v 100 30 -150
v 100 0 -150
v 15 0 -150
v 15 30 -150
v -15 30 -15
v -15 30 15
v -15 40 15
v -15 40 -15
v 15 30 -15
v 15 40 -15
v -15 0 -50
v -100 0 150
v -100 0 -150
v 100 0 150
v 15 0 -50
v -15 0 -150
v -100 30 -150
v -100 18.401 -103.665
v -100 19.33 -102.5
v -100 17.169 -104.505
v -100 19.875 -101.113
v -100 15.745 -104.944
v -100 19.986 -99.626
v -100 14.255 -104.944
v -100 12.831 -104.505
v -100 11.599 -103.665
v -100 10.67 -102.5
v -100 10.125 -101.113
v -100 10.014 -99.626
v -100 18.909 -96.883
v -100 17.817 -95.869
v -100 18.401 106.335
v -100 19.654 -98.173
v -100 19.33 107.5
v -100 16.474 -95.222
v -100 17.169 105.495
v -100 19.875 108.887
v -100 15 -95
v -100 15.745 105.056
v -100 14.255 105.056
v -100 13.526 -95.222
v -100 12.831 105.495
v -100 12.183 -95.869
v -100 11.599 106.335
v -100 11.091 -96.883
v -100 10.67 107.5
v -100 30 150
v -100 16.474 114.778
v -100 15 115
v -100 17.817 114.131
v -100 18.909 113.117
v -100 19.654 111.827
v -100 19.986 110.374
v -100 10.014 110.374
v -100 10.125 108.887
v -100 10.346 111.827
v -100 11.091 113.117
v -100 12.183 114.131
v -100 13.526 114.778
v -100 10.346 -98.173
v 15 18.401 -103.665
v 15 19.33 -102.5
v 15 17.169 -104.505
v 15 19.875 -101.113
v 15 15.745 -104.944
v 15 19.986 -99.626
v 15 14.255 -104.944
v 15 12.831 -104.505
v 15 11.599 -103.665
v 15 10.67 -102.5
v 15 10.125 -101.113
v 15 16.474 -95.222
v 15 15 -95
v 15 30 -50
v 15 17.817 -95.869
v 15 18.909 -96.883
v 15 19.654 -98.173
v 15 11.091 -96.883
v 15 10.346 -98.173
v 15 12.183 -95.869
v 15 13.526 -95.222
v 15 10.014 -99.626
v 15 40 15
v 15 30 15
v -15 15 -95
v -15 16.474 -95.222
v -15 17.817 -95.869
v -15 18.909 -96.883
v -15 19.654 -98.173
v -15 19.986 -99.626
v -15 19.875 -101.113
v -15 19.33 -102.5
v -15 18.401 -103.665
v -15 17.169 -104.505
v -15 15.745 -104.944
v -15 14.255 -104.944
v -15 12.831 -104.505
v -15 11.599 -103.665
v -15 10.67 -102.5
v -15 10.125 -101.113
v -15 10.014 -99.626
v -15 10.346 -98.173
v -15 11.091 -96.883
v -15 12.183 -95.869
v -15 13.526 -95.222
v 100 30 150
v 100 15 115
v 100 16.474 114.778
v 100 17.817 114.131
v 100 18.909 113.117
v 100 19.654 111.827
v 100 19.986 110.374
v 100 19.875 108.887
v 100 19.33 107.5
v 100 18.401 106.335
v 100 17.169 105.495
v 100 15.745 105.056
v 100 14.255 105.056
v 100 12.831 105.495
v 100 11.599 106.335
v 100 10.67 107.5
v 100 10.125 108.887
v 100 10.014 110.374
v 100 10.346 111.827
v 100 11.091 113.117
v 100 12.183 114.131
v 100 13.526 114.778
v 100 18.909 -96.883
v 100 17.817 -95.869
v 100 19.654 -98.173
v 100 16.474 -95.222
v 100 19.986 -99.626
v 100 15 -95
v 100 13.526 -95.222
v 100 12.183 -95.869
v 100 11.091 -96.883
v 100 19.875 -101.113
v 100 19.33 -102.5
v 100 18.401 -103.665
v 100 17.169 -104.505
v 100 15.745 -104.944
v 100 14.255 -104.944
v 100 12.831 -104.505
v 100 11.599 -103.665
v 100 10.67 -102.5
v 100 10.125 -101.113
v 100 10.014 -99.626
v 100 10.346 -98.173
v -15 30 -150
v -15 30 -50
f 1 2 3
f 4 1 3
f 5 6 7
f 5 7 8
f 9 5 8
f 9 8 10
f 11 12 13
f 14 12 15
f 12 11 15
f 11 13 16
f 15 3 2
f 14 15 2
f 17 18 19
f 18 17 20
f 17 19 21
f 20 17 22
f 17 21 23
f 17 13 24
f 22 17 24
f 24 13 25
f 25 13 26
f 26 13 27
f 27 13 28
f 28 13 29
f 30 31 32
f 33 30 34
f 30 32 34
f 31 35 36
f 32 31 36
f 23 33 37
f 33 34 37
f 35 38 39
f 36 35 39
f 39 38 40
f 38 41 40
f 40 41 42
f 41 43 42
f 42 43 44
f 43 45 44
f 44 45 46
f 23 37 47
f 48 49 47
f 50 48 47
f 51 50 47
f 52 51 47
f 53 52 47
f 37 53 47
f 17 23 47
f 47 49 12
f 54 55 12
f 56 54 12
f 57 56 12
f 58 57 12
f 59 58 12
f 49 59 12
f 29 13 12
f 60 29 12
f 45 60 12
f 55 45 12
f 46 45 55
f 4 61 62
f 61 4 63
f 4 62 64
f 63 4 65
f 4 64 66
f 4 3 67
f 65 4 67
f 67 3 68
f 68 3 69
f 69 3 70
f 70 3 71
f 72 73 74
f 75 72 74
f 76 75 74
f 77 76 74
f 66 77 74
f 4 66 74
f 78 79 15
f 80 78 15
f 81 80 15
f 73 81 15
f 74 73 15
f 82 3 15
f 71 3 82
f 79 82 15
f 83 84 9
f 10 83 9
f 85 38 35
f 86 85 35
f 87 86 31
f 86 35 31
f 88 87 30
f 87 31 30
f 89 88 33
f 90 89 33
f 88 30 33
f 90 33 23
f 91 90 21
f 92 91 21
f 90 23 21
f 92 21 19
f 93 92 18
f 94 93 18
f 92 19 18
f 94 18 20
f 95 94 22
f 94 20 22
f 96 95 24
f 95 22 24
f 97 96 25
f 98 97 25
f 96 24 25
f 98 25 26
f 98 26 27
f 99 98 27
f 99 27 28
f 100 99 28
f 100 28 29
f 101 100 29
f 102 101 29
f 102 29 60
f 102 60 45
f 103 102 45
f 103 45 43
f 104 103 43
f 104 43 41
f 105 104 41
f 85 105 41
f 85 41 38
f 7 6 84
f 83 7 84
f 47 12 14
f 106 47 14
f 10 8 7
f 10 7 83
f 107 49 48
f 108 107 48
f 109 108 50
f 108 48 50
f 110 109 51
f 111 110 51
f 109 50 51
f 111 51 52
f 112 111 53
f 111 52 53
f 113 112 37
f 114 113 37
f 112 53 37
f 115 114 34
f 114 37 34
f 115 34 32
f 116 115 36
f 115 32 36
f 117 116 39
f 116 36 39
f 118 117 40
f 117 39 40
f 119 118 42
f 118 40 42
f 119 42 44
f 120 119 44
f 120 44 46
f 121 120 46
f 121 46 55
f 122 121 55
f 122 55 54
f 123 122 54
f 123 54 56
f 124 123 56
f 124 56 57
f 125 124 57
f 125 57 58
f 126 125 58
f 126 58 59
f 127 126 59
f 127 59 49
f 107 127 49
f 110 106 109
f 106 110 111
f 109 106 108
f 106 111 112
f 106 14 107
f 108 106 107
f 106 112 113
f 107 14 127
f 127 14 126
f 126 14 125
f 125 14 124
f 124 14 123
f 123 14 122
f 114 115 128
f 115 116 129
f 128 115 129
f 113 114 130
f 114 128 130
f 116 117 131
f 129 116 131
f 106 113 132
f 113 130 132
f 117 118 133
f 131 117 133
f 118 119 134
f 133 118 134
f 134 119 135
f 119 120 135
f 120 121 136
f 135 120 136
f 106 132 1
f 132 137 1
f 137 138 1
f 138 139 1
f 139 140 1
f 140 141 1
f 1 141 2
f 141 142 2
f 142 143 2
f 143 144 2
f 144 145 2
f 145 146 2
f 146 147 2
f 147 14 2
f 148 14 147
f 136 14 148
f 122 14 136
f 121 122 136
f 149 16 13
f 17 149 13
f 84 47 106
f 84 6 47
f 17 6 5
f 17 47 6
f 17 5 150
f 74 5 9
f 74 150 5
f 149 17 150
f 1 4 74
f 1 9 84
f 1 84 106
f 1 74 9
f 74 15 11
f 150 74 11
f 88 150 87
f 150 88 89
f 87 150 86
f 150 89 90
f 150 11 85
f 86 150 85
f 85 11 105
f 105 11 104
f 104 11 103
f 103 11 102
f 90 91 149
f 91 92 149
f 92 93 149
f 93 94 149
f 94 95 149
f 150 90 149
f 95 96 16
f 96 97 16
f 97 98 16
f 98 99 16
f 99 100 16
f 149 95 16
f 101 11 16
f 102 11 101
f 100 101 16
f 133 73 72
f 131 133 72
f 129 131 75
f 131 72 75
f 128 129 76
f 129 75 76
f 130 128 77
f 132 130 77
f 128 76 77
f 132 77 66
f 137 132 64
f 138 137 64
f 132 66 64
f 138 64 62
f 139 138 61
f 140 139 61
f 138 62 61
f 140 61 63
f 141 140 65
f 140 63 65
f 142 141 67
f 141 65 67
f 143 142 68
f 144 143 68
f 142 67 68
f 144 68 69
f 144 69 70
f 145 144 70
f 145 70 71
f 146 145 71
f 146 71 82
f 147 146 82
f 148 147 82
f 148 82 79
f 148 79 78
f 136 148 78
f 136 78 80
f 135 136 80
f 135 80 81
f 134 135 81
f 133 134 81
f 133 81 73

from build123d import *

# Parameters (mm, degrees)
EXTRUDE_1_DEPTH     = 30
SKETCH_2_R          = 5
CUT_EXTRUDE_1_DEPTH = 335
SKETCH_3_W          = 30
SKETCH_3_H          = 30
EXTRUDE_2_DEPTH     = 10


with BuildPart() as part:
    # 草圖1 → 填料-伸長1 (new body)
    with BuildSketch(Plane(origin=(0, 0, 0), x_dir=(1, 0, 0), z_dir=(0, 1, 0))):
        Polygon((-100, -150), (100, -150), (100, 150), (15, 150), (15, 50), (-15, 50), (-15, 150), (-100, 150), align=None)
    extrude(amount=EXTRUDE_1_DEPTH)

    # 草圖2 → 除料-伸長1 (cut)
    with BuildSketch(Plane.ZY.offset(100)):
        with Locations((-100, 15)):
            Circle(SKETCH_2_R)
        with Locations((110, 15)):
            Circle(SKETCH_2_R)
    extrude(amount=-CUT_EXTRUDE_1_DEPTH, mode=Mode.SUBTRACT)

    # 草圖3 → 填料-伸長2 (add)
    with BuildSketch(Plane(origin=(0, 30, 0), x_dir=(1, 0, 0), z_dir=(0, 1, 0))):
        Rectangle(SKETCH_3_W, SKETCH_3_H)
    extrude(amount=EXTRUDE_2_DEPTH)


solid = part.part
